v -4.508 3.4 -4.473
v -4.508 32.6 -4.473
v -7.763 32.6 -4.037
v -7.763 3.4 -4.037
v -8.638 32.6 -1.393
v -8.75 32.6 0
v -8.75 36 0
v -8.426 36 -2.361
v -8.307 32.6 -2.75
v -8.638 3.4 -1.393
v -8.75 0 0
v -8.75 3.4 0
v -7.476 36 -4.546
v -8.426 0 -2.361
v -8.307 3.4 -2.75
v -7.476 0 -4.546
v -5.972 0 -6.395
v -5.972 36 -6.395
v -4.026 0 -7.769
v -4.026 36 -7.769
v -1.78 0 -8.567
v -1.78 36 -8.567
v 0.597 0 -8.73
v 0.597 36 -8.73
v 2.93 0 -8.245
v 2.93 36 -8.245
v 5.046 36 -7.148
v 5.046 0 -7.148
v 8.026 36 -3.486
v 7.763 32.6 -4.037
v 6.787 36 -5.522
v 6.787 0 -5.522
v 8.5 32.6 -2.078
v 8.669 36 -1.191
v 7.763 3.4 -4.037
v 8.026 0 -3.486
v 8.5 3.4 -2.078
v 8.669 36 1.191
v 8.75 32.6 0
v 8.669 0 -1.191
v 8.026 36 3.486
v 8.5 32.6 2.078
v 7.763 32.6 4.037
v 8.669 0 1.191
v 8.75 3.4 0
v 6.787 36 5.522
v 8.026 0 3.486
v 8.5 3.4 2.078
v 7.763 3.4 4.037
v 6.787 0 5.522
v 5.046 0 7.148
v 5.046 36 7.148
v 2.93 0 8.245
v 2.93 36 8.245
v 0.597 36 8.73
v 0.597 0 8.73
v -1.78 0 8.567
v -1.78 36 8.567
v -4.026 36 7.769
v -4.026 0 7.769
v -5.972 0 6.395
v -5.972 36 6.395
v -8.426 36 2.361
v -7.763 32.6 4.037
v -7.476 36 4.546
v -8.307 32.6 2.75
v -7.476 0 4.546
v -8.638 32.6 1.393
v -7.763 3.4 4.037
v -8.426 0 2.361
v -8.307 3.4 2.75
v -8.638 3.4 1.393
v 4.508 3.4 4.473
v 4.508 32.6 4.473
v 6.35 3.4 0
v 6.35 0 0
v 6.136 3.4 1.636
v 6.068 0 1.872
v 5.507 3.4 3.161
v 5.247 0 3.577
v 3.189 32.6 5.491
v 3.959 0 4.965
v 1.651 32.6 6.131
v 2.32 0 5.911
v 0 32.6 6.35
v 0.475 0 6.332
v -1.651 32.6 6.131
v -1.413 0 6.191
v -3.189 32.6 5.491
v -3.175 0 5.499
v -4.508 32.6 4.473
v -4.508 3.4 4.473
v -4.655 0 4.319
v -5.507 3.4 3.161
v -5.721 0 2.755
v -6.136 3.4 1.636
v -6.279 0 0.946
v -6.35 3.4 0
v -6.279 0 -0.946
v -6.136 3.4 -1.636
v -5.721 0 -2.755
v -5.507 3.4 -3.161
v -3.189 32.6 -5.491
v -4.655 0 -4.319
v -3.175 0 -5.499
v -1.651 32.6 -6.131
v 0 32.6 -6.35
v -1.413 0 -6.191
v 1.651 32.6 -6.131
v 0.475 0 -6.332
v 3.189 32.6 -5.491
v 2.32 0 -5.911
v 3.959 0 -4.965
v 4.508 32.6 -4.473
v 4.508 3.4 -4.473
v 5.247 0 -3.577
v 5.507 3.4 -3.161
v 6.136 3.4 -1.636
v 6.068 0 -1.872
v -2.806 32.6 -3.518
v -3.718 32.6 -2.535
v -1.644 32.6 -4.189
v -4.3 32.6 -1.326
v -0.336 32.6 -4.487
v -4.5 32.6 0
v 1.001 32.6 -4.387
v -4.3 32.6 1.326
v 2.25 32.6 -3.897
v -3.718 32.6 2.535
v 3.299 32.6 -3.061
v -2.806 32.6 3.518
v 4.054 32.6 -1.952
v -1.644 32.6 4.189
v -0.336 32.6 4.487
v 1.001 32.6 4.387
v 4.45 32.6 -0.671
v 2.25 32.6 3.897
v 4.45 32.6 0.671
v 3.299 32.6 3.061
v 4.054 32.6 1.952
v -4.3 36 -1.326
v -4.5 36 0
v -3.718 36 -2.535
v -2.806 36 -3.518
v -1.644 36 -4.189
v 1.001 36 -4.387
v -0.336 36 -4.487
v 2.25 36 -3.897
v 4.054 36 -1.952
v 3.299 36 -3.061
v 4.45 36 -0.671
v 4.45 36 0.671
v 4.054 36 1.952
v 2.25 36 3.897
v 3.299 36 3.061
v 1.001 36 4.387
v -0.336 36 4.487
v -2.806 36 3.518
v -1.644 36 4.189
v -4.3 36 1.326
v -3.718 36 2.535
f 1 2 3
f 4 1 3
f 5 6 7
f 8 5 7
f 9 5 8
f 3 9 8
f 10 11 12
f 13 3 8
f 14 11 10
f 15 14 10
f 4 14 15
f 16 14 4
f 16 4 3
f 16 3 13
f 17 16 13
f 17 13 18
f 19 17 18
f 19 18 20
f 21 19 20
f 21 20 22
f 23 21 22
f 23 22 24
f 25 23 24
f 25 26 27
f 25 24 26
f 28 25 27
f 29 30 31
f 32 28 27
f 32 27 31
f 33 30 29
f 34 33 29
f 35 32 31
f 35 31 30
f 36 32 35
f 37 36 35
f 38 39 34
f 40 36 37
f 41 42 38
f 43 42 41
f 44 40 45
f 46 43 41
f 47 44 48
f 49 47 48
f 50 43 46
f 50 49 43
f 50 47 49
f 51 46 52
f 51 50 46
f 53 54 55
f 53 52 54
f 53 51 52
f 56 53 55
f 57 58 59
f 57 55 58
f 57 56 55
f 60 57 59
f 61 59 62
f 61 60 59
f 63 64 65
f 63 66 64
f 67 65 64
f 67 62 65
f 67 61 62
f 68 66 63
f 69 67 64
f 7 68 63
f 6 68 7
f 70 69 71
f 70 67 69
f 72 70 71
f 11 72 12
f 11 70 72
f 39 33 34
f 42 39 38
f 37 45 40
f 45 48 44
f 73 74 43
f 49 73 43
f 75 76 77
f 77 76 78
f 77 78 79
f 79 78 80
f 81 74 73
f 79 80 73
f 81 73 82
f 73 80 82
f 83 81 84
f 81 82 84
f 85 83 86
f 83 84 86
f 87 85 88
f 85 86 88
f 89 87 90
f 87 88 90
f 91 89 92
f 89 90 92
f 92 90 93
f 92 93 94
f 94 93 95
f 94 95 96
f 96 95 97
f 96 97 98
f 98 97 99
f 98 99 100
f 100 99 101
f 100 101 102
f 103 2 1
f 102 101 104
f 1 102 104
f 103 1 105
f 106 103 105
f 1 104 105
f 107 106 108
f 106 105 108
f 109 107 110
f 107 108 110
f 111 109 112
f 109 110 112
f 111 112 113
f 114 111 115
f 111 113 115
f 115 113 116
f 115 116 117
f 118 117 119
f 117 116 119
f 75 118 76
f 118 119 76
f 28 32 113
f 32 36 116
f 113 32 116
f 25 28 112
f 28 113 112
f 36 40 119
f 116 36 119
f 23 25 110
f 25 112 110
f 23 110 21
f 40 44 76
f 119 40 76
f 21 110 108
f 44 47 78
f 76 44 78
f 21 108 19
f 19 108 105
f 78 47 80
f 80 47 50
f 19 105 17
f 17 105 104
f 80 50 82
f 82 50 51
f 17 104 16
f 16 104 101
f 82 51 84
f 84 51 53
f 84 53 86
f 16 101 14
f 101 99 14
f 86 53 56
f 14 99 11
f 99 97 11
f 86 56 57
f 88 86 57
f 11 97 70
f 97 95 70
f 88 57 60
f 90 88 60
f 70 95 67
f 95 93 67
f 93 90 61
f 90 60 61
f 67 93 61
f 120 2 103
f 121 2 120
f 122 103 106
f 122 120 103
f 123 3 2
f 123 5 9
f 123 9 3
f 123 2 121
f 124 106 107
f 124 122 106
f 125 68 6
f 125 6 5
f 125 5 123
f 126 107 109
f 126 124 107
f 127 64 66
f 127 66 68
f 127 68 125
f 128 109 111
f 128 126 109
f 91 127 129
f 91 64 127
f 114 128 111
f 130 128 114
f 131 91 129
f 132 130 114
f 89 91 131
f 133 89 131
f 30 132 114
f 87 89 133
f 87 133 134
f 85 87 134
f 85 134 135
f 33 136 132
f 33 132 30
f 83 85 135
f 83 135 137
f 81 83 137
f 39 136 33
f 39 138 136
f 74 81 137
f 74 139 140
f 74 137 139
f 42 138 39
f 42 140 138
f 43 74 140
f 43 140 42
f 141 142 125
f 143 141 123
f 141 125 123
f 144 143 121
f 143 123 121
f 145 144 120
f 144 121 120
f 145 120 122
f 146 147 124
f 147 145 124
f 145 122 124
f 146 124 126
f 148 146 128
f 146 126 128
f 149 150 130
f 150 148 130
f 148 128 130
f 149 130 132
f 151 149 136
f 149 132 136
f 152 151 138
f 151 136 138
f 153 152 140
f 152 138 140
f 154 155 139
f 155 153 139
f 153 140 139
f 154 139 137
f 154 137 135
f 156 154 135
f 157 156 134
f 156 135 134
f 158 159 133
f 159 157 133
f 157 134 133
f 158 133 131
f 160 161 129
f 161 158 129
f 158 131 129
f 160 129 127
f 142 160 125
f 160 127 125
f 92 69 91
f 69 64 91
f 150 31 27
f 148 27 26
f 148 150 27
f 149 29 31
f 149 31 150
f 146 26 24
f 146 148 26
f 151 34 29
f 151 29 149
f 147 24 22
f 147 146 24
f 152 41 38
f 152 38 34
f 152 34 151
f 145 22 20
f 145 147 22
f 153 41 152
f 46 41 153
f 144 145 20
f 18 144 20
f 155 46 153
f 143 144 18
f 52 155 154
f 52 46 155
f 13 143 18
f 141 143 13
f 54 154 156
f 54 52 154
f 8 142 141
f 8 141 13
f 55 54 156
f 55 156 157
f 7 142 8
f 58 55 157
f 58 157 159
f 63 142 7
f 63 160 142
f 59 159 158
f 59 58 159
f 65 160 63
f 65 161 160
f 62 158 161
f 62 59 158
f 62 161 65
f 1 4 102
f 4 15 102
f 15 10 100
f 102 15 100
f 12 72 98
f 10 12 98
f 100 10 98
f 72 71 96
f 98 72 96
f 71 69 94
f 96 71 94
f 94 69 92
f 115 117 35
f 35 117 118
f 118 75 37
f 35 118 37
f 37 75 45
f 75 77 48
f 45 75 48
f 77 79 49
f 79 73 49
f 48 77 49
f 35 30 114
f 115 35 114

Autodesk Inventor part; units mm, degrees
ref_plane "YZ Plane" through (0, 0, 0) normal (1, 0, 0) x (0, 1, 0)
ref_plane "XZ Plane" through (0, 0, 0) normal (0, 1, 0) x (-1, 0, 0)
ref_plane "XY Plane" through (0, 0, 0) normal (0, 0, 1) x (1, 0, 0)
sketch "Sketch6" plane through (0, 0, 0) normal (0, 1, 0) x (-1, 0, 0)
  circle A0 centre (0, 0) radius 8.75
  circle A1 centre (0, 0) radius 4.5
  dimension "d18" = 17.5
  dimension "d35" = 9
extrude "Extrusion5" add sketch "Sketch6" along normal blind 36
sketch "Sketch10" plane through (0, 0, 0) normal (0, -1, 0) x (1, 0, 0)
  circle A0 centre (0, 0) radius 6.35
  dimension "d32" = 12.7
extrude "Extrusion8" cut sketch "Sketch10" against normal blind 32.6
sketch "Sketch11" plane through (0, 32.6, 0) normal (0, -1, 0) x (1, 0, 0)
  arc A0 (-4.2968, -4.4) -> (4.2968, -4.4) centre (0, 0) ccw
  line L0 (-4.2968, 4.4) -> (-16.8146, 2.7257)
  arc A1 (-16.8146, 2.7257) -> (-16.8146, -2.7257) centre (-16.45, 0) ccw
  line L1 (-16.8146, -2.7257) -> (-4.2968, -4.4)
  line L2 (4.2968, -4.4) -> (16.8146, -2.7257)
  arc A2 (16.8146, -2.7257) -> (16.8146, 2.7257) centre (16.45, 0) ccw
  line L3 (16.8146, 2.7257) -> (4.2968, 4.4)
  line L4 (-4.2968, -4.4) -> (4.2968, -4.4) construction
  line L5 (-4.2968, 4.4) -> (4.2968, 4.4) construction
  line L6 (-19.2, 0) -> (19.2, 0) construction
  arc A3 (-6.15, 0) -> (-4.2968, -4.4) centre (0, 0) ccw construction
  arc A4 (-4.2968, 4.4) -> (-6.15, 0) centre (0, 0) ccw construction
  arc A5 (4.2968, 4.4) -> (-4.2968, 4.4) centre (0, 0) ccw
  arc A6 (6.15, 0) -> (4.2968, 4.4) centre (0, 0) ccw construction
  arc A7 (4.2968, -4.4) -> (6.15, 0) centre (0, 0) ccw construction
  line L7 (-4.3428, -4.4947) -> (-16.8278, -2.8248)
  arc A8 (-16.8278, 2.8248) -> (-16.8278, -2.8248) centre (-16.45, 0) ccw
  line L8 (-16.8278, 2.8248) -> (-4.3428, 4.4947)
  arc A9 (4.3428, 4.4947) -> (-4.3428, 4.4947) centre (0, 0) ccw
  line L9 (4.3428, 4.4947) -> (16.8278, 2.8248)
  arc A10 (16.8278, -2.8248) -> (16.8278, 2.8248) centre (16.45, 0) ccw
  line L10 (16.8278, -2.8248) -> (4.3428, -4.4947)
  arc A11 (-4.3428, -4.4947) -> (4.3428, -4.4947) centre (0, 0) ccw
  point P0 (0, 0)
  point P1 (0, 0)
  dimension "d36" = 12.3
  dimension "d37" = 8.8
  dimension "d38" = 38.4
  dimension "d39" = 2.75
  dimension "d40" = 0.1
extrude "Extrusion9" cut sketch "Sketch11" along normal blind 29.2 contours L1 A1 L0 A5 L3 A2 L2 A0 | L7 A8 L8 A9 L9 A10 L10 A11
properties part number "attachmentcustom" material "PET Plastic"
